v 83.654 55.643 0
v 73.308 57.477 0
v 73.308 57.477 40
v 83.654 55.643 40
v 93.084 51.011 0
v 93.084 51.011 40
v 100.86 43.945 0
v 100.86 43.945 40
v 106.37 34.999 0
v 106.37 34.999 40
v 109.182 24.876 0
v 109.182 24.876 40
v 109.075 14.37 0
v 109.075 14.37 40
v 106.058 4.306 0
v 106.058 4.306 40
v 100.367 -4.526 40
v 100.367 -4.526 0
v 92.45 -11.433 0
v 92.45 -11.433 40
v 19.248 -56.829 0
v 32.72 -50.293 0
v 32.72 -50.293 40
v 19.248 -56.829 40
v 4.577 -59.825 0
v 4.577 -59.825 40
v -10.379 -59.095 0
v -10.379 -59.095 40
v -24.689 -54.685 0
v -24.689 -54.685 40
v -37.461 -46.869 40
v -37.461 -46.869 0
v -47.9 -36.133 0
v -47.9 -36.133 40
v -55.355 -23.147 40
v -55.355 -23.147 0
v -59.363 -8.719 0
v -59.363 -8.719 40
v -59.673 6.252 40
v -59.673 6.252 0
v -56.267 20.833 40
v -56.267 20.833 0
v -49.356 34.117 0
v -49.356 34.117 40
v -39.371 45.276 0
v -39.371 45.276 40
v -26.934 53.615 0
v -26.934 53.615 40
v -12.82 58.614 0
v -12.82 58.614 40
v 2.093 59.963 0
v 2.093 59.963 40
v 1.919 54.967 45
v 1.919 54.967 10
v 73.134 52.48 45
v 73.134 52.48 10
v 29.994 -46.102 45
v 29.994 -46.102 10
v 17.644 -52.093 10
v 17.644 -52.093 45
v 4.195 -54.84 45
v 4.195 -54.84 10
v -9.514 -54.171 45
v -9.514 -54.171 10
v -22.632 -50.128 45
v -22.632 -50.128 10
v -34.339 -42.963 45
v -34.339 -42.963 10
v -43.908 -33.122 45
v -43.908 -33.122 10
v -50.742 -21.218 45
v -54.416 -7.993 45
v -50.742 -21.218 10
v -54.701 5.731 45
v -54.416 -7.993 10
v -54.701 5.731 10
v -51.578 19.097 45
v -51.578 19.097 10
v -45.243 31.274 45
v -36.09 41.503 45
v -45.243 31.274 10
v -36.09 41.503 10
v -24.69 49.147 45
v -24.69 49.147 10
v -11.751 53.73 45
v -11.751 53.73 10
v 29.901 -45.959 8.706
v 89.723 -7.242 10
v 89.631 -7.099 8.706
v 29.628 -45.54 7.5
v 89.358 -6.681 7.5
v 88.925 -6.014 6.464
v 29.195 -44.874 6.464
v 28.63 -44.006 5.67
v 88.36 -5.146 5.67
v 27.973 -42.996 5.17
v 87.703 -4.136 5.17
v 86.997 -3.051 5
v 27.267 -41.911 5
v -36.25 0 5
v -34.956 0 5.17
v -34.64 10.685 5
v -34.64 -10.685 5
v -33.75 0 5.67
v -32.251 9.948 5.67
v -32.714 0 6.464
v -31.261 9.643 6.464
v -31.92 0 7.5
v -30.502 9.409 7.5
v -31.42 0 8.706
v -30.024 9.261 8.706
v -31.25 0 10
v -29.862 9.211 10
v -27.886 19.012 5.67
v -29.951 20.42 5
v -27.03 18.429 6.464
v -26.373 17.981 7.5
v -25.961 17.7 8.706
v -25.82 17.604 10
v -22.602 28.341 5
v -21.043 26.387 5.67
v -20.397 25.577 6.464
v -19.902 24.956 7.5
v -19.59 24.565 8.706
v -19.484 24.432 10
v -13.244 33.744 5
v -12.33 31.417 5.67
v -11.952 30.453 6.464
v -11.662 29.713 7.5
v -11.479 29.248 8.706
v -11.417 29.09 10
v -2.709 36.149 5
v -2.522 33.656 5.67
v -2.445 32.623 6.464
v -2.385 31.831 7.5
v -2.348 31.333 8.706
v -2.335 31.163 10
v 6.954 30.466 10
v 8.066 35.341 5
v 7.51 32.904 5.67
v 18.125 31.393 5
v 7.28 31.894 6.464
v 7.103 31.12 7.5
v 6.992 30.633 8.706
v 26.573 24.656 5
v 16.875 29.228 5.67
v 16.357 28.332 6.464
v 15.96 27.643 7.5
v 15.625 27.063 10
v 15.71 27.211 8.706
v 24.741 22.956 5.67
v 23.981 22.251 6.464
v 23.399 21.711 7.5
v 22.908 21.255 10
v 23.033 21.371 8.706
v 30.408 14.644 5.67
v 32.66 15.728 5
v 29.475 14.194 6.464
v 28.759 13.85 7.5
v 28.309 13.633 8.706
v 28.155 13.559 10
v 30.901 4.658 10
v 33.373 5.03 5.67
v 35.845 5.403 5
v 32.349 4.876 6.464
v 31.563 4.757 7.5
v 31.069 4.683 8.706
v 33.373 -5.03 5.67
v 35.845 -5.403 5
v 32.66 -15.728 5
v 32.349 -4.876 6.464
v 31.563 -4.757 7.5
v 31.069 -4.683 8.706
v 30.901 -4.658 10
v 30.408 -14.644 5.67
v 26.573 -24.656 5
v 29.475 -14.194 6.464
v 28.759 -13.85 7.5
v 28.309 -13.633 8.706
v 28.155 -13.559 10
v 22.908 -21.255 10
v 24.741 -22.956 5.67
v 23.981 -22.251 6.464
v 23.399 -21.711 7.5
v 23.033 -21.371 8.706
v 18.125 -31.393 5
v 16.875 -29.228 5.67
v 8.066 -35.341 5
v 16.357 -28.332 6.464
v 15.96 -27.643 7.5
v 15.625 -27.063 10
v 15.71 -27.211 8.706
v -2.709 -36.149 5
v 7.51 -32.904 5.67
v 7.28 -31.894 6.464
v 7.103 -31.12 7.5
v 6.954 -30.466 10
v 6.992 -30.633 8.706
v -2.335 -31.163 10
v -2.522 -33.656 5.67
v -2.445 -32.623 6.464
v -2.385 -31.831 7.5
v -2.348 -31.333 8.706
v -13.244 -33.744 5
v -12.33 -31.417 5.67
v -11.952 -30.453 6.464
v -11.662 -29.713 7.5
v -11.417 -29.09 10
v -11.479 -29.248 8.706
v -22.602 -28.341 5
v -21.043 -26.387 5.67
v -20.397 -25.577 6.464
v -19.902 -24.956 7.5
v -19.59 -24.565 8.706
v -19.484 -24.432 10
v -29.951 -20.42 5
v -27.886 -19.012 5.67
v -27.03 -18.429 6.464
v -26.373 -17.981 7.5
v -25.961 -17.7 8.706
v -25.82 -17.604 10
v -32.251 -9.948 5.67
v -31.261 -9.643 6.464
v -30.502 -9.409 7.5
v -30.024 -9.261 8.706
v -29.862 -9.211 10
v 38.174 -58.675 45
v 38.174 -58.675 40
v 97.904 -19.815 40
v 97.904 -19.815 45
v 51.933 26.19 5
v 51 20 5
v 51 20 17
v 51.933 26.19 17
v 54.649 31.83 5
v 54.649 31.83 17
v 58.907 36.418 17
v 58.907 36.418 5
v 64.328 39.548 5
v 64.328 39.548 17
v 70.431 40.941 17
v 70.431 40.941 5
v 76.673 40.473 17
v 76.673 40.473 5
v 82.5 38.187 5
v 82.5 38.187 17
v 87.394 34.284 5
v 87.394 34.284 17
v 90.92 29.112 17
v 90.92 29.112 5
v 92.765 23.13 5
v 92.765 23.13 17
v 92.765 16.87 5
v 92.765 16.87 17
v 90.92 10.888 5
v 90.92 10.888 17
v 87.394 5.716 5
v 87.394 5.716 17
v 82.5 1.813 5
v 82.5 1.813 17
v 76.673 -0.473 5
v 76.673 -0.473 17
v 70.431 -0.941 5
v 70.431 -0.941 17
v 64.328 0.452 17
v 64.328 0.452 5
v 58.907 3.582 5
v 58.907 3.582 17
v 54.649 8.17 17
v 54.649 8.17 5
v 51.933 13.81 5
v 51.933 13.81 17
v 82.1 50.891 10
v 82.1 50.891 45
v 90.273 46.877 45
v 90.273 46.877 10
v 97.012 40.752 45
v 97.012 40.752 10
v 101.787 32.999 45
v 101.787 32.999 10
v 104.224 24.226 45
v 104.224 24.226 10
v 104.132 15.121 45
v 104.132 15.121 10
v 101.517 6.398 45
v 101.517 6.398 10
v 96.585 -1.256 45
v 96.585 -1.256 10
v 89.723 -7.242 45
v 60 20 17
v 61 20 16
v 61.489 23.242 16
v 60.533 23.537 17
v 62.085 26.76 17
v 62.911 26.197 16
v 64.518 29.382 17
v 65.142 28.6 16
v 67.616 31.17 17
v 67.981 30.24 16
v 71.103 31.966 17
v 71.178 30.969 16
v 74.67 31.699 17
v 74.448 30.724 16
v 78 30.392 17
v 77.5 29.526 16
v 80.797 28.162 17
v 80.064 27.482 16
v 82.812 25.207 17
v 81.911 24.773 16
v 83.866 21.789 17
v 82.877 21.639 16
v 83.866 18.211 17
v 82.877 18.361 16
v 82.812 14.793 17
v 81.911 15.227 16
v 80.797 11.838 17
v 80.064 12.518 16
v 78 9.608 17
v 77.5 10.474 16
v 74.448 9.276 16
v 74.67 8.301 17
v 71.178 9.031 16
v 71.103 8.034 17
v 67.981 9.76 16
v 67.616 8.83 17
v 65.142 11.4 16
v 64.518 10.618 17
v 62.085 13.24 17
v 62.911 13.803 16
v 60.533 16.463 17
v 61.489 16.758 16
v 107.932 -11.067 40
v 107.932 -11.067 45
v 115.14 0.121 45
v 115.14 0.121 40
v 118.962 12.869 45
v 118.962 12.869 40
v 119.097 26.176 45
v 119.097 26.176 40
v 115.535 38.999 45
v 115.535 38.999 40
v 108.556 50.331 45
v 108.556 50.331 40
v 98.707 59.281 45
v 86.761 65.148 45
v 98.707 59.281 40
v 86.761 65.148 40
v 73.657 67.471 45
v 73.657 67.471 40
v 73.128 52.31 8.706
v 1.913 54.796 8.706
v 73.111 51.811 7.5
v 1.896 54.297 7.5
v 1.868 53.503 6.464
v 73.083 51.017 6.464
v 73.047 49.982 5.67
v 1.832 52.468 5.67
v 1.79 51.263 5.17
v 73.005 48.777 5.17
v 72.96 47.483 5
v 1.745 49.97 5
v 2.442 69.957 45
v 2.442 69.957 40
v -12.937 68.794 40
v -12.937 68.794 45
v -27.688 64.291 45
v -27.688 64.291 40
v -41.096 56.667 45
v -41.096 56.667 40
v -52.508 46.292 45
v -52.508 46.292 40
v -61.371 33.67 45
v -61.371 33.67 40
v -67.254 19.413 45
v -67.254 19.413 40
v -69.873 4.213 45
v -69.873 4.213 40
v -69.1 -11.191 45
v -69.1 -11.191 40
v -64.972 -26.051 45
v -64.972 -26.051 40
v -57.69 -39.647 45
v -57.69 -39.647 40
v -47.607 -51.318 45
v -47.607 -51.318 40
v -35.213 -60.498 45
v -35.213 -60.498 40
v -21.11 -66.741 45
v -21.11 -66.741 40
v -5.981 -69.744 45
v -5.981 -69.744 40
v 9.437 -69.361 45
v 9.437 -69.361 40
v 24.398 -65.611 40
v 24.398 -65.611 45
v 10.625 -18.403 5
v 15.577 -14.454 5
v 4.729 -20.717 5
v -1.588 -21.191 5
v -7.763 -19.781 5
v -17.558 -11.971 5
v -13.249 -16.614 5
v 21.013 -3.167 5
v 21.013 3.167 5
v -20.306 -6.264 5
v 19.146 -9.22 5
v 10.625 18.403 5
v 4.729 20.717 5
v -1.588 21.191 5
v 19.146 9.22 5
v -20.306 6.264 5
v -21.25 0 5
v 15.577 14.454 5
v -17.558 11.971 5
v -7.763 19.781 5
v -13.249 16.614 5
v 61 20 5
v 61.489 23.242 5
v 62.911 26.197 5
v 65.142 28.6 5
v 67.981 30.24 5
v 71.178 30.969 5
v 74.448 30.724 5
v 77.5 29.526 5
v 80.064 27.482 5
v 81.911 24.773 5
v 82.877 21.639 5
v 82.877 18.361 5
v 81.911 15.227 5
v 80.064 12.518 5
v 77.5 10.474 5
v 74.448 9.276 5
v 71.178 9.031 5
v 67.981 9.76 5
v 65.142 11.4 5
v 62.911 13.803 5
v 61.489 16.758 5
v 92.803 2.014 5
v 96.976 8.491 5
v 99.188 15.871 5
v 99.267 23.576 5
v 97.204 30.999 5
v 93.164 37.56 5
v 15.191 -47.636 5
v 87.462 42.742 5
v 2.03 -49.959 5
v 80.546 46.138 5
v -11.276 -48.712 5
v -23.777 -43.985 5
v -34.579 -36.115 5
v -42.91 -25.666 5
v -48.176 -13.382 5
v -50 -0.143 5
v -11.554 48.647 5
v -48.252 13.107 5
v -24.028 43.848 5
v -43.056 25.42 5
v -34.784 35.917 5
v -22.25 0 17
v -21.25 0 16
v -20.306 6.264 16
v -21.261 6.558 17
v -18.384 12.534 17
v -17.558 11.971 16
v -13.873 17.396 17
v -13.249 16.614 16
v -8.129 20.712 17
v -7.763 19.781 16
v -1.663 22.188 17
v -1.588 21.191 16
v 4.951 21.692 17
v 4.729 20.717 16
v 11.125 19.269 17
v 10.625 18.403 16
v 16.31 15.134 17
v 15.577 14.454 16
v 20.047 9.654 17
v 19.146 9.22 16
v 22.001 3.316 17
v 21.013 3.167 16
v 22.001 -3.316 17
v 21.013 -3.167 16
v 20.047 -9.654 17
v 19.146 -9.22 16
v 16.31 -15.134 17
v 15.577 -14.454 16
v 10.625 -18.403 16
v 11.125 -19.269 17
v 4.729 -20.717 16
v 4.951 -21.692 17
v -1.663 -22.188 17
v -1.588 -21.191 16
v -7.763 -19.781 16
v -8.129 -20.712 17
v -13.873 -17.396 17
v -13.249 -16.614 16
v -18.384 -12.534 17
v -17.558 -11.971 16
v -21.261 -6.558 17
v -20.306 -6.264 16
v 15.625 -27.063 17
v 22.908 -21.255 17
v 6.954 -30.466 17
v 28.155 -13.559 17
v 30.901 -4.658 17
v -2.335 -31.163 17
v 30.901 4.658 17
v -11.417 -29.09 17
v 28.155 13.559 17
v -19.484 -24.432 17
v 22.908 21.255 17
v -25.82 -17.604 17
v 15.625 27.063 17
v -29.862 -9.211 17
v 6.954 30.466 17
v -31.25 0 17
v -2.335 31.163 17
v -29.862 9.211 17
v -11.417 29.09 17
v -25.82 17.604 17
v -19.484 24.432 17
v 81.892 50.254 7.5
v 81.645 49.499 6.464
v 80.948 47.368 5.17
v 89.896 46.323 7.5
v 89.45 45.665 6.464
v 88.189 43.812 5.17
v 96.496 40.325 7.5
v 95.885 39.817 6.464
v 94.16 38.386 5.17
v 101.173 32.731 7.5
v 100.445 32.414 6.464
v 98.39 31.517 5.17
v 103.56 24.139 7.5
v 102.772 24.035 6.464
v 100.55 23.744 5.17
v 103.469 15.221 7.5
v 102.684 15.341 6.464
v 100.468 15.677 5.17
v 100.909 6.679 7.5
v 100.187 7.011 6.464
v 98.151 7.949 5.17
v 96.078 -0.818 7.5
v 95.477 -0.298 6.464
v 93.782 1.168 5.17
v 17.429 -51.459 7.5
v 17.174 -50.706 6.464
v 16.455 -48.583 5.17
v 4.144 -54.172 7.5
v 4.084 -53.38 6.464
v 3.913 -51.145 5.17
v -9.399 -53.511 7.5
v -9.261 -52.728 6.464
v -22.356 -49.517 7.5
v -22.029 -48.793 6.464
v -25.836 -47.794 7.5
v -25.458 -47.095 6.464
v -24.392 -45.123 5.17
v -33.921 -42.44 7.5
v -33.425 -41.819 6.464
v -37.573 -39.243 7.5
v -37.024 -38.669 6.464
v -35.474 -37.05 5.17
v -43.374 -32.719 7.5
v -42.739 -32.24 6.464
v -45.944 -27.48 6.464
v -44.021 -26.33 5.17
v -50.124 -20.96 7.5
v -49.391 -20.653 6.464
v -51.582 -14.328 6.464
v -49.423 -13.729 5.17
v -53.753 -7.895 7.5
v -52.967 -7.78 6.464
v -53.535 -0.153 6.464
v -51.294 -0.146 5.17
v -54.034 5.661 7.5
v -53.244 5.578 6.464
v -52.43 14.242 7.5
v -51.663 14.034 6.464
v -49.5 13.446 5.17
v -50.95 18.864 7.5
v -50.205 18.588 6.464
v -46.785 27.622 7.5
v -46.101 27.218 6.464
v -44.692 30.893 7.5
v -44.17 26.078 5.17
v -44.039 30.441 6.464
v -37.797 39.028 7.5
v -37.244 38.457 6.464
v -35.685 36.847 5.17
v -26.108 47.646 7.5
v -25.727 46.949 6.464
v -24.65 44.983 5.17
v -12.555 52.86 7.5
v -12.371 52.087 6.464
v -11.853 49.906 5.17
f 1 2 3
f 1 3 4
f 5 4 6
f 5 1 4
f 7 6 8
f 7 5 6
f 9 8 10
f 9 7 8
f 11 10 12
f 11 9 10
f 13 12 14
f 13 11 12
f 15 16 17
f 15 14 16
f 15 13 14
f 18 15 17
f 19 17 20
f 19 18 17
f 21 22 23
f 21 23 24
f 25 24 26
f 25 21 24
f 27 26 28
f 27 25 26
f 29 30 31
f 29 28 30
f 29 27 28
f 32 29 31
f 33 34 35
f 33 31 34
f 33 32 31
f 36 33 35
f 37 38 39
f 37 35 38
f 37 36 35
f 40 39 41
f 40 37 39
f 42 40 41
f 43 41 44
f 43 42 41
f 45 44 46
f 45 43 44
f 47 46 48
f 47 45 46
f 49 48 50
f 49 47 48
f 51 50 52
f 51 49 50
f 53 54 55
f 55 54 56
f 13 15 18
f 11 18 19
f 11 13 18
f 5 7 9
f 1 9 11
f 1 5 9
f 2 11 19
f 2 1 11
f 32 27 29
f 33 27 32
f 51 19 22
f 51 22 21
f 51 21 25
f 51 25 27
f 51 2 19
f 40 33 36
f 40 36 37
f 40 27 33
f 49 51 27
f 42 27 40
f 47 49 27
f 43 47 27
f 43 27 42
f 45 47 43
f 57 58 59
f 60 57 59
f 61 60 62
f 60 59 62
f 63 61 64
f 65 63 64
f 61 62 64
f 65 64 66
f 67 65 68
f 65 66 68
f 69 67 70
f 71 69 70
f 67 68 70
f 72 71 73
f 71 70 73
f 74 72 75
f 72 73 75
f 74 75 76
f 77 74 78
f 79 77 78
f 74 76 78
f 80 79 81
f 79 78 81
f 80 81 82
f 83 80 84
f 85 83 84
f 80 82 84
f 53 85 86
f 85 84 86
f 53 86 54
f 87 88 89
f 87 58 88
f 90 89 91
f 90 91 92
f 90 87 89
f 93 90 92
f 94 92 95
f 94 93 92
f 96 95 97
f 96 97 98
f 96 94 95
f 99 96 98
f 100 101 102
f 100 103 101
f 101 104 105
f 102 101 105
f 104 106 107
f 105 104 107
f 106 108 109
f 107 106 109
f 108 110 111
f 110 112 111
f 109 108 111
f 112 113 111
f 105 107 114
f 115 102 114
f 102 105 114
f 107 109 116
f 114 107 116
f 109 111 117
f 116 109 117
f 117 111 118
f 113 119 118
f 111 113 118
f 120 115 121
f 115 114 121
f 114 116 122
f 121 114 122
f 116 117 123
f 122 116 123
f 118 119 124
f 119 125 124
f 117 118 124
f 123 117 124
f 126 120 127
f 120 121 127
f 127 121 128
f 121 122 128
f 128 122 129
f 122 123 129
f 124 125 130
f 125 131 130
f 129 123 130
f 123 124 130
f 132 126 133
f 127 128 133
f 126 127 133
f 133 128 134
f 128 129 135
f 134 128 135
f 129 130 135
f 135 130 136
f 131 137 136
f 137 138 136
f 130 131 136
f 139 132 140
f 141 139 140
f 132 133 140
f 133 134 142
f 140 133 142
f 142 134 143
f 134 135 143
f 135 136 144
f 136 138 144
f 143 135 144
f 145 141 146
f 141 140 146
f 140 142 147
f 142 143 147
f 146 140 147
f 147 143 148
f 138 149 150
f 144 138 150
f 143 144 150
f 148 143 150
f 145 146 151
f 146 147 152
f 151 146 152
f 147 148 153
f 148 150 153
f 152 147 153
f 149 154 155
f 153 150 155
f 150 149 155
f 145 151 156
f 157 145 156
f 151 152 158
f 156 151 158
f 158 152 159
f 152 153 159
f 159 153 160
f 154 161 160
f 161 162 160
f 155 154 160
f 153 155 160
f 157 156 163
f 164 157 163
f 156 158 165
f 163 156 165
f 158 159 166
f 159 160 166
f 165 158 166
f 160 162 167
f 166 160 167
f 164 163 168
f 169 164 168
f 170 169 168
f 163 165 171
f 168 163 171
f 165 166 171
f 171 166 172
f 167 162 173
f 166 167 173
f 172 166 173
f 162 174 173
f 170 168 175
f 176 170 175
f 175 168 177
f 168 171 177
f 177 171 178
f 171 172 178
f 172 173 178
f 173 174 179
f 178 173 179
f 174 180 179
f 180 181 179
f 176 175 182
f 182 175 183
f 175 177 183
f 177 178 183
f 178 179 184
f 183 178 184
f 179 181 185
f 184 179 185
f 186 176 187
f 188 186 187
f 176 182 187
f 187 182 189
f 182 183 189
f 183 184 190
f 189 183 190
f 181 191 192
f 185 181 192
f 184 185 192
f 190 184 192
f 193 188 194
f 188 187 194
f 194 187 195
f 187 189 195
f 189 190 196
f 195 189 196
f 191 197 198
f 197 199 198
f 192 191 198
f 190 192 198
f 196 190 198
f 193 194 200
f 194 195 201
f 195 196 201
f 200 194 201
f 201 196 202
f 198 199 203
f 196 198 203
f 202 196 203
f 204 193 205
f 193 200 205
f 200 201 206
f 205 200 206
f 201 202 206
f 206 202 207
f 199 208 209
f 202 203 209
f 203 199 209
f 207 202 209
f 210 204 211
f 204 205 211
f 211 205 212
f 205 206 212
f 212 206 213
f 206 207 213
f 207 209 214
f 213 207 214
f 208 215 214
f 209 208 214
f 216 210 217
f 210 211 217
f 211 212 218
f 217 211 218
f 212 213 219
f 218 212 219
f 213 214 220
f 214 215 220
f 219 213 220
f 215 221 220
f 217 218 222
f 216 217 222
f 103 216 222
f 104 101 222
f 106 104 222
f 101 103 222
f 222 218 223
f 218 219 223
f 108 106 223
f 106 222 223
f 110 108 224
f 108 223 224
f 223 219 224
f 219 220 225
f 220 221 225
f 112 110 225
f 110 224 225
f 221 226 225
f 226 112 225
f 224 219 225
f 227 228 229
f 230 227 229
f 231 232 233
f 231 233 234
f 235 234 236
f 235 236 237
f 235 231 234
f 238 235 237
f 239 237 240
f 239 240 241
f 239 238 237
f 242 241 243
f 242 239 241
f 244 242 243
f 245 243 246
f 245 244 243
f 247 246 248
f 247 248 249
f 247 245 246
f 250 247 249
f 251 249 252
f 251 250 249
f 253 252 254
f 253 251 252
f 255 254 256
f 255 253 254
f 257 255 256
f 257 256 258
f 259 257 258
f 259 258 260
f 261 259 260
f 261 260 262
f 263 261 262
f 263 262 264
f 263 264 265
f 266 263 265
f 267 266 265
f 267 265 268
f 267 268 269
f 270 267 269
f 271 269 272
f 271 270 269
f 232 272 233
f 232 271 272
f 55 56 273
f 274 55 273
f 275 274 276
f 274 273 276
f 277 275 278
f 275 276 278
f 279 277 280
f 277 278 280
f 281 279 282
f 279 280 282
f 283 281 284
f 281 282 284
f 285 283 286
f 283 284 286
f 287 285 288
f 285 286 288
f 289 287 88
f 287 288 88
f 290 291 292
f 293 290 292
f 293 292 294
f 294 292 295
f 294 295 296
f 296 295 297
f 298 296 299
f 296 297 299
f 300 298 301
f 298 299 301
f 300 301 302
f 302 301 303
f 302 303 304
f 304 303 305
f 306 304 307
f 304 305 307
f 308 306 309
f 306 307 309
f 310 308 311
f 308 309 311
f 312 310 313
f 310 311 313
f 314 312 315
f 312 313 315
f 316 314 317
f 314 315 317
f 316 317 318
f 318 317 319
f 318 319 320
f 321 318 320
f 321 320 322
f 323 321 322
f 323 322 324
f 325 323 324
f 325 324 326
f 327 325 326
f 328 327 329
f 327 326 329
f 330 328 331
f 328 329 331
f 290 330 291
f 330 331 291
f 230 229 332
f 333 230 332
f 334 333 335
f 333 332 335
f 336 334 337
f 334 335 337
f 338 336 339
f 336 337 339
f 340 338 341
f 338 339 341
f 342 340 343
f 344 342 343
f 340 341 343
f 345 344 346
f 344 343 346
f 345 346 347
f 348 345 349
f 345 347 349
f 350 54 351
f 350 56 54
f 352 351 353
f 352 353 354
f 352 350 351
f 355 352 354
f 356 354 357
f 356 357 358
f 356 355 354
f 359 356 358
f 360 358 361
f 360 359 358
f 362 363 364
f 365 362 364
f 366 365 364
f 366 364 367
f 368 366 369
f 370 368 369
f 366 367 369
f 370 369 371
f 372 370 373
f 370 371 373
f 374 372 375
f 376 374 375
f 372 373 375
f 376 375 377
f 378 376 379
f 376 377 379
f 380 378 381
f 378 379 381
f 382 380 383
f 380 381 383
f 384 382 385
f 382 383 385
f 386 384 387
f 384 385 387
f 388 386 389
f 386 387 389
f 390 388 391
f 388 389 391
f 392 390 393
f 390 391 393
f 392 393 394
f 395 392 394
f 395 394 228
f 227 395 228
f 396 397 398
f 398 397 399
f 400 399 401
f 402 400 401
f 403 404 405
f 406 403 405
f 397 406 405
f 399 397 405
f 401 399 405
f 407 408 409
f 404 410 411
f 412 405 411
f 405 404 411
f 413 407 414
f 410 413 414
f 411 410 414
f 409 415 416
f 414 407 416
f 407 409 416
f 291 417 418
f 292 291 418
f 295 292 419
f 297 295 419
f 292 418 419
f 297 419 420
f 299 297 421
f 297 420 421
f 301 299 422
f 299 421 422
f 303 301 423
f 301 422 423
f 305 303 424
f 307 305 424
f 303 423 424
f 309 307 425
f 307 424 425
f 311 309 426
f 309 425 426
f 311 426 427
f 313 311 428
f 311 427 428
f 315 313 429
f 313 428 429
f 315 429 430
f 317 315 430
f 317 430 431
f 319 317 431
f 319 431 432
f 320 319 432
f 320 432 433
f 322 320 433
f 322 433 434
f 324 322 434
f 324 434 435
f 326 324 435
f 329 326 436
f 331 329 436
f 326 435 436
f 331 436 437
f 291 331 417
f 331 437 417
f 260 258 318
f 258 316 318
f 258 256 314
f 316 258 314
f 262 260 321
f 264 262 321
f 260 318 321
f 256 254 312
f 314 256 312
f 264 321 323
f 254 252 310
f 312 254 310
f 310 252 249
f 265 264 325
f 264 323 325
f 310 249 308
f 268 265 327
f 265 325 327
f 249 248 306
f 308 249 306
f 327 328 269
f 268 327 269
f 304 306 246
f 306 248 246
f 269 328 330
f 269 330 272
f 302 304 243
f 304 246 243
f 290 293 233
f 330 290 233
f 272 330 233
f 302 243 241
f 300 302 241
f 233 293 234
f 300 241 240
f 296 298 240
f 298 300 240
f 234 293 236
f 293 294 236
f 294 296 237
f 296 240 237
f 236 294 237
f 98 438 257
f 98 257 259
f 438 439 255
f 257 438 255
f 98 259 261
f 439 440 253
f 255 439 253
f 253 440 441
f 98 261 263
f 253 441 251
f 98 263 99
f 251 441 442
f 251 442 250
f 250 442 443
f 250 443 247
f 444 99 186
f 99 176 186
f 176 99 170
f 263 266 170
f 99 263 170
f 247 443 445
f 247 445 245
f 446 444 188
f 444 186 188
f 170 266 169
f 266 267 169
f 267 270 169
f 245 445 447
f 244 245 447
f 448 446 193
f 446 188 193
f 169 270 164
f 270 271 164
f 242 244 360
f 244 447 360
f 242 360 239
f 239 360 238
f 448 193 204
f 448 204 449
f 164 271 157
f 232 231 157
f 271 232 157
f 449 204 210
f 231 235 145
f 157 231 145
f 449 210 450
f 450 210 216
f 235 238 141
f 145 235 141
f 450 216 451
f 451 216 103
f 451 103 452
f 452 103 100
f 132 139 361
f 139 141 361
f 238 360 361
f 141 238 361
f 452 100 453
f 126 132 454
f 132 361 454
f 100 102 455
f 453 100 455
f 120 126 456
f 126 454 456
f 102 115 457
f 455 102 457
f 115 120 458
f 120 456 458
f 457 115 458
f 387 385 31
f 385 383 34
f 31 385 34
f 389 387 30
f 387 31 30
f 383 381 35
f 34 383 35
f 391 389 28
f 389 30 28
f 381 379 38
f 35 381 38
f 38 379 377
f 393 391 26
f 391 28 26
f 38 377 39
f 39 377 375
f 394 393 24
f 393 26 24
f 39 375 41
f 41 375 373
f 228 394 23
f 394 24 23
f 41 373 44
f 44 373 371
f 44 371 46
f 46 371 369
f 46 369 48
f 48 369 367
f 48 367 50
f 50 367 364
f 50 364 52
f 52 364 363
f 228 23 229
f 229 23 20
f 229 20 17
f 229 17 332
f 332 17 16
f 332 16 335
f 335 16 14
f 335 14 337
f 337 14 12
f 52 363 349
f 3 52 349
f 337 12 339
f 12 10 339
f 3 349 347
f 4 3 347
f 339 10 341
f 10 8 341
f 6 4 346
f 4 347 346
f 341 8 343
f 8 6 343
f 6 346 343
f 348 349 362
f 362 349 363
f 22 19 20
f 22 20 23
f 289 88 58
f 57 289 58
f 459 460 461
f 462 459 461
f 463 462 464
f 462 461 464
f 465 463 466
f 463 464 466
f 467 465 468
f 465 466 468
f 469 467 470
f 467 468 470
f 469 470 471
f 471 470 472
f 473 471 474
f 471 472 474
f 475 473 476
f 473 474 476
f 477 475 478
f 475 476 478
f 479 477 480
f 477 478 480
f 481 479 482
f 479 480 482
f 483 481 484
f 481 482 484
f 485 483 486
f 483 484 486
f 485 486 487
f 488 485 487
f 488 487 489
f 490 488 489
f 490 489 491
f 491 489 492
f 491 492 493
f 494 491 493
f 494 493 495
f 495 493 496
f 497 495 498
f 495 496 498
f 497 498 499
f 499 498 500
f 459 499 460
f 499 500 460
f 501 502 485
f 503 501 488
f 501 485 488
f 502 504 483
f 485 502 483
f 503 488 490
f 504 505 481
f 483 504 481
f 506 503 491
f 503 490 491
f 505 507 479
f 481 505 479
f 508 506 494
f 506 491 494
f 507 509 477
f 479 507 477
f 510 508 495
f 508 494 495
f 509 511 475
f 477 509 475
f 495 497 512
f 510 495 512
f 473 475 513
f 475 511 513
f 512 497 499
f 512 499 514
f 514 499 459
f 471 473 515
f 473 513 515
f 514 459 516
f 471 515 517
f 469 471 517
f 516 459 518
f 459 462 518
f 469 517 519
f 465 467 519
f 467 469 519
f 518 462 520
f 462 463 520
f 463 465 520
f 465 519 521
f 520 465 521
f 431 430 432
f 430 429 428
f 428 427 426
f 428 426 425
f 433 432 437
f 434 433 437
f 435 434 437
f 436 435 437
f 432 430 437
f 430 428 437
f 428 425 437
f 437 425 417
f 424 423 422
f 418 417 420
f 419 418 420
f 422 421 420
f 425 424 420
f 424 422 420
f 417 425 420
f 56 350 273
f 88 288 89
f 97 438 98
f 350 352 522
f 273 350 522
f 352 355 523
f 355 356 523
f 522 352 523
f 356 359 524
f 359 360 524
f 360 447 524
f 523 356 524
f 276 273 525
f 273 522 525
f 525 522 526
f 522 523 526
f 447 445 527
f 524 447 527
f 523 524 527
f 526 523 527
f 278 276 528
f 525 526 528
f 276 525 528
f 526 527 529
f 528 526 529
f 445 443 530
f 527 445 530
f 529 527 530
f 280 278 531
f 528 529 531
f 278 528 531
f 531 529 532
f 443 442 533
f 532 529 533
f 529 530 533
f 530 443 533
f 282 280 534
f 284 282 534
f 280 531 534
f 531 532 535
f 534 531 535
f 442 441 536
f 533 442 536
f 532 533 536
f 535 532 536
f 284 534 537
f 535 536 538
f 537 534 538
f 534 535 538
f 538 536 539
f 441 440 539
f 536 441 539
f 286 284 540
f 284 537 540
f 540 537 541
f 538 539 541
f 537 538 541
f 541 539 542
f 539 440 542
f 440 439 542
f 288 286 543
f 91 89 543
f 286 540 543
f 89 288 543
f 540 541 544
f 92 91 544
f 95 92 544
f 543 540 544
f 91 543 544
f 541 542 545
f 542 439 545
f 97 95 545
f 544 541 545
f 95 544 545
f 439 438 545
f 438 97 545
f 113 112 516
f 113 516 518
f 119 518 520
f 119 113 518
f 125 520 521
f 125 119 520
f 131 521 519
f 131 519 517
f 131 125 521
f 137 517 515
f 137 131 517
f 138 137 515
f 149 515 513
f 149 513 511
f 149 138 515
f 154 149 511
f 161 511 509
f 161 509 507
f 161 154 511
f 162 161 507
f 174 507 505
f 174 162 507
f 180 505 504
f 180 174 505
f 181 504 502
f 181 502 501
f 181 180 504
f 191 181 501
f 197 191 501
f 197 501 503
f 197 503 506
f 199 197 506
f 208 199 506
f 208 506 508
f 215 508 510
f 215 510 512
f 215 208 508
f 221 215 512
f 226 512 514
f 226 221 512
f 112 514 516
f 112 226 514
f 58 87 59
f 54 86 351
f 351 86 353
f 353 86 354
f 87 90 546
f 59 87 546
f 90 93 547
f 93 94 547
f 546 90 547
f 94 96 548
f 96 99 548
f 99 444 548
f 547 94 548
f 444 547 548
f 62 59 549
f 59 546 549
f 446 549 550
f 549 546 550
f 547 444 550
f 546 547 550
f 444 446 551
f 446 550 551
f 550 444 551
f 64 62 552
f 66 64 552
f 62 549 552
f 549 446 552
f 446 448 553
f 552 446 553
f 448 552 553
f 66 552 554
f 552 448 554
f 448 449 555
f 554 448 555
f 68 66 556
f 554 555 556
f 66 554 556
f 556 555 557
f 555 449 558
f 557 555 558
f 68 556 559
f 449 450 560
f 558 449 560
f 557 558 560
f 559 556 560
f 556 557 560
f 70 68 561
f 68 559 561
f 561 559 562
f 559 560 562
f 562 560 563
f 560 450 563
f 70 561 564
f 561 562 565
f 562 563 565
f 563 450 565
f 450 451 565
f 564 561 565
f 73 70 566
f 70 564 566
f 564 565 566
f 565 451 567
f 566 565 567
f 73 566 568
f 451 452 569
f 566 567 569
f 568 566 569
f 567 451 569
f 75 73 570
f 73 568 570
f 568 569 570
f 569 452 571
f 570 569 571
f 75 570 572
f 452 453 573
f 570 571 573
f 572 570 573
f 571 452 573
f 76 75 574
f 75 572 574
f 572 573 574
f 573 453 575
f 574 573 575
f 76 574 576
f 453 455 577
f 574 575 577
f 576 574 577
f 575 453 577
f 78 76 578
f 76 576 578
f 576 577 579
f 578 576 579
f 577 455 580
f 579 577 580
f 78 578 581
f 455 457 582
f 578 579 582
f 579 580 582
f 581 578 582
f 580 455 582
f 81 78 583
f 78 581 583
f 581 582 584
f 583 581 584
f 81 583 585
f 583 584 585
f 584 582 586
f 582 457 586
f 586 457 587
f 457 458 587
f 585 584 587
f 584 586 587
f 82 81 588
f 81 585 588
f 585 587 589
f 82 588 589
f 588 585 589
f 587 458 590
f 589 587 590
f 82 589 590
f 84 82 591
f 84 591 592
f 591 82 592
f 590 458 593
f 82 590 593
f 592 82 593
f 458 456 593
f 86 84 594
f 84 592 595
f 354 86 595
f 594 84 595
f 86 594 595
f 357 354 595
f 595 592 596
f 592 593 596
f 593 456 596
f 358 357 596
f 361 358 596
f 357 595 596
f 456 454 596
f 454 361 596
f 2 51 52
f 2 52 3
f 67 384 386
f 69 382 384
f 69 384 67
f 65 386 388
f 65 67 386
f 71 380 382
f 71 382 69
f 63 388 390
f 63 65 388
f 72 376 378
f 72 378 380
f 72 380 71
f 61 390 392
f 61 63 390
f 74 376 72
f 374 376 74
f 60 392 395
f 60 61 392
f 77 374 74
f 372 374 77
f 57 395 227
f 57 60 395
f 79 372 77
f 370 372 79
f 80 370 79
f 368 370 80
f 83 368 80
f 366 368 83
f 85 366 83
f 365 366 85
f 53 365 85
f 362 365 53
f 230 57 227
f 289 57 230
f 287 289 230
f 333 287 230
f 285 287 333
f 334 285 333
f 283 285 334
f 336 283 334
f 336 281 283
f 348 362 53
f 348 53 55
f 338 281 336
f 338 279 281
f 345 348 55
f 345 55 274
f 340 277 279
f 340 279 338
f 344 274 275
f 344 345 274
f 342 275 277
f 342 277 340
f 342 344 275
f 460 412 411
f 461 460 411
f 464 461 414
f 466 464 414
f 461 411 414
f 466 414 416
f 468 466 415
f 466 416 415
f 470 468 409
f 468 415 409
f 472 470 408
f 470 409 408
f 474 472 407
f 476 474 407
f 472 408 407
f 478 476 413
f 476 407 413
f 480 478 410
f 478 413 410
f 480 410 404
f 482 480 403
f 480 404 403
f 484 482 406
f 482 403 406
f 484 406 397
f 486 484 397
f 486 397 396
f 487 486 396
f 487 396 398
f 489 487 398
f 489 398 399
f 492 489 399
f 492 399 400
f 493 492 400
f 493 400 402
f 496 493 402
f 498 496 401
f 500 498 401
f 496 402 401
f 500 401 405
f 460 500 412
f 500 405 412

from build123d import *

# Parameters (mm, degrees)
BOSS_EXTRUDE4_DEPTH = 45
SHELL3_T            = -5
BOSS_EXTRUDE5_START = -5
BOSS_EXTRUDE5_DEPTH = 5
SKETCH10_R          = 31.25
SKETCH10_R_2        = 21.25
SKETCH10_R_3        = 21
SKETCH10_R_4        = 11
BOSS_EXTRUDE6_DEPTH = 12
FILLET2_R           = 5
CHAMFER1_SIZE       = 1


with BuildPart() as part:
    # Sketch8 → Boss-Extrude4 (new body)
    with BuildSketch(Plane.XY):
        with BuildLine():
            Line((2.09348148, 59.963466672), (73.308425925, 57.47716667))
            ThreePointArc((73.308425925, 57.47716667), (108.131921611, 30.036644892), (92.450170063, -11.433112229))
            Line((92.450170063, -11.433112229), (32.720272102, -50.292979566))
            ThreePointArc((32.720272102, -50.292979566), (-57.811074578, -16.058631827), (2.09348148, 59.963466672))
        make_face()
    extrude(amount=BOSS_EXTRUDE4_DEPTH)

    # Shell3
    shell3_openings = [part.faces().sort_by_distance(p)[0] for p in [
        (19.954889275, 5.543024799, 45),
    ]]
    offset(amount=SHELL3_T, openings=shell3_openings, kind=Kind.INTERSECTION)

    # Sketch9 → Boss-Extrude5 (add)
    with BuildSketch(Plane.XY.offset(45).offset(BOSS_EXTRUDE5_START)):
        with BuildLine():
            Line((73.657339505, 67.471077782), (2.44239506, 69.957377784))
            ThreePointArc((2.44239506, 69.957377784), (-67.446253674, -18.735070465), (38.173650785, -58.675142827))
            Line((38.173650785, -58.675142827), (97.903548747, -19.81527549))
            ThreePointArc((97.903548747, -19.81527549), (117.767100707, 32.71308353), (73.657339505, 67.471077782))
        make_face()
        with BuildLine():
            Line((32.720272102, -50.292979566), (92.450170063, -11.433112229))
            ThreePointArc((92.450170063, -11.433112229), (108.131921611, 30.036644892), (73.308425925, 57.47716667))
            Line((73.308425925, 57.47716667), (2.09348148, 59.963466672))
            ThreePointArc((2.09348148, 59.963466672), (-57.811074578, -16.058631827), (32.720272102, -50.292979566))
        make_face(mode=Mode.SUBTRACT)
    extrude(amount=BOSS_EXTRUDE5_DEPTH)

    # Sketch10 → Boss-Extrude6 (add)
    # profile 1 of 2: a face of its own
    with BuildSketch(Plane(origin=(0, 0, 5), x_dir=(-1, 0, 0), z_dir=(0, 0, -1))):
        Circle(SKETCH10_R)
        Circle(SKETCH10_R_2, mode=Mode.SUBTRACT)
    # profile 2 of 2: a face of its own
    with BuildSketch(Plane(origin=(0, 0, 5), x_dir=(-1, 0, 0), z_dir=(0, 0, -1))):
        with Locations((-72, 20)):
            Circle(SKETCH10_R_3)
        with Locations((-72, 20)):
            Circle(SKETCH10_R_4, mode=Mode.SUBTRACT)
    extrude(amount=-BOSS_EXTRUDE6_DEPTH)

    # Fillet2
    fillet2_edges = [part.edges().sort_by_distance(p)[0] for p in [
        (-52.99348503, -14.720412508, 5),
        (59.858531741, -26.671964267, 5),
        (103.314332063, 28.698425573, 5),
        (37.526496913, 53.723361115, 5),
        (31.25, 0, 5),
    ]]
    fillet(fillet2_edges, radius=FILLET2_R)

    # Chamfer1
    chamfer1_edges = [part.edges().sort_by_distance(p)[0] for p in [
        (21.25, 0, 17),
        (83, 20, 17),
    ]]
    chamfer(chamfer1_edges, length=CHAMFER1_SIZE)


solid = part.part
